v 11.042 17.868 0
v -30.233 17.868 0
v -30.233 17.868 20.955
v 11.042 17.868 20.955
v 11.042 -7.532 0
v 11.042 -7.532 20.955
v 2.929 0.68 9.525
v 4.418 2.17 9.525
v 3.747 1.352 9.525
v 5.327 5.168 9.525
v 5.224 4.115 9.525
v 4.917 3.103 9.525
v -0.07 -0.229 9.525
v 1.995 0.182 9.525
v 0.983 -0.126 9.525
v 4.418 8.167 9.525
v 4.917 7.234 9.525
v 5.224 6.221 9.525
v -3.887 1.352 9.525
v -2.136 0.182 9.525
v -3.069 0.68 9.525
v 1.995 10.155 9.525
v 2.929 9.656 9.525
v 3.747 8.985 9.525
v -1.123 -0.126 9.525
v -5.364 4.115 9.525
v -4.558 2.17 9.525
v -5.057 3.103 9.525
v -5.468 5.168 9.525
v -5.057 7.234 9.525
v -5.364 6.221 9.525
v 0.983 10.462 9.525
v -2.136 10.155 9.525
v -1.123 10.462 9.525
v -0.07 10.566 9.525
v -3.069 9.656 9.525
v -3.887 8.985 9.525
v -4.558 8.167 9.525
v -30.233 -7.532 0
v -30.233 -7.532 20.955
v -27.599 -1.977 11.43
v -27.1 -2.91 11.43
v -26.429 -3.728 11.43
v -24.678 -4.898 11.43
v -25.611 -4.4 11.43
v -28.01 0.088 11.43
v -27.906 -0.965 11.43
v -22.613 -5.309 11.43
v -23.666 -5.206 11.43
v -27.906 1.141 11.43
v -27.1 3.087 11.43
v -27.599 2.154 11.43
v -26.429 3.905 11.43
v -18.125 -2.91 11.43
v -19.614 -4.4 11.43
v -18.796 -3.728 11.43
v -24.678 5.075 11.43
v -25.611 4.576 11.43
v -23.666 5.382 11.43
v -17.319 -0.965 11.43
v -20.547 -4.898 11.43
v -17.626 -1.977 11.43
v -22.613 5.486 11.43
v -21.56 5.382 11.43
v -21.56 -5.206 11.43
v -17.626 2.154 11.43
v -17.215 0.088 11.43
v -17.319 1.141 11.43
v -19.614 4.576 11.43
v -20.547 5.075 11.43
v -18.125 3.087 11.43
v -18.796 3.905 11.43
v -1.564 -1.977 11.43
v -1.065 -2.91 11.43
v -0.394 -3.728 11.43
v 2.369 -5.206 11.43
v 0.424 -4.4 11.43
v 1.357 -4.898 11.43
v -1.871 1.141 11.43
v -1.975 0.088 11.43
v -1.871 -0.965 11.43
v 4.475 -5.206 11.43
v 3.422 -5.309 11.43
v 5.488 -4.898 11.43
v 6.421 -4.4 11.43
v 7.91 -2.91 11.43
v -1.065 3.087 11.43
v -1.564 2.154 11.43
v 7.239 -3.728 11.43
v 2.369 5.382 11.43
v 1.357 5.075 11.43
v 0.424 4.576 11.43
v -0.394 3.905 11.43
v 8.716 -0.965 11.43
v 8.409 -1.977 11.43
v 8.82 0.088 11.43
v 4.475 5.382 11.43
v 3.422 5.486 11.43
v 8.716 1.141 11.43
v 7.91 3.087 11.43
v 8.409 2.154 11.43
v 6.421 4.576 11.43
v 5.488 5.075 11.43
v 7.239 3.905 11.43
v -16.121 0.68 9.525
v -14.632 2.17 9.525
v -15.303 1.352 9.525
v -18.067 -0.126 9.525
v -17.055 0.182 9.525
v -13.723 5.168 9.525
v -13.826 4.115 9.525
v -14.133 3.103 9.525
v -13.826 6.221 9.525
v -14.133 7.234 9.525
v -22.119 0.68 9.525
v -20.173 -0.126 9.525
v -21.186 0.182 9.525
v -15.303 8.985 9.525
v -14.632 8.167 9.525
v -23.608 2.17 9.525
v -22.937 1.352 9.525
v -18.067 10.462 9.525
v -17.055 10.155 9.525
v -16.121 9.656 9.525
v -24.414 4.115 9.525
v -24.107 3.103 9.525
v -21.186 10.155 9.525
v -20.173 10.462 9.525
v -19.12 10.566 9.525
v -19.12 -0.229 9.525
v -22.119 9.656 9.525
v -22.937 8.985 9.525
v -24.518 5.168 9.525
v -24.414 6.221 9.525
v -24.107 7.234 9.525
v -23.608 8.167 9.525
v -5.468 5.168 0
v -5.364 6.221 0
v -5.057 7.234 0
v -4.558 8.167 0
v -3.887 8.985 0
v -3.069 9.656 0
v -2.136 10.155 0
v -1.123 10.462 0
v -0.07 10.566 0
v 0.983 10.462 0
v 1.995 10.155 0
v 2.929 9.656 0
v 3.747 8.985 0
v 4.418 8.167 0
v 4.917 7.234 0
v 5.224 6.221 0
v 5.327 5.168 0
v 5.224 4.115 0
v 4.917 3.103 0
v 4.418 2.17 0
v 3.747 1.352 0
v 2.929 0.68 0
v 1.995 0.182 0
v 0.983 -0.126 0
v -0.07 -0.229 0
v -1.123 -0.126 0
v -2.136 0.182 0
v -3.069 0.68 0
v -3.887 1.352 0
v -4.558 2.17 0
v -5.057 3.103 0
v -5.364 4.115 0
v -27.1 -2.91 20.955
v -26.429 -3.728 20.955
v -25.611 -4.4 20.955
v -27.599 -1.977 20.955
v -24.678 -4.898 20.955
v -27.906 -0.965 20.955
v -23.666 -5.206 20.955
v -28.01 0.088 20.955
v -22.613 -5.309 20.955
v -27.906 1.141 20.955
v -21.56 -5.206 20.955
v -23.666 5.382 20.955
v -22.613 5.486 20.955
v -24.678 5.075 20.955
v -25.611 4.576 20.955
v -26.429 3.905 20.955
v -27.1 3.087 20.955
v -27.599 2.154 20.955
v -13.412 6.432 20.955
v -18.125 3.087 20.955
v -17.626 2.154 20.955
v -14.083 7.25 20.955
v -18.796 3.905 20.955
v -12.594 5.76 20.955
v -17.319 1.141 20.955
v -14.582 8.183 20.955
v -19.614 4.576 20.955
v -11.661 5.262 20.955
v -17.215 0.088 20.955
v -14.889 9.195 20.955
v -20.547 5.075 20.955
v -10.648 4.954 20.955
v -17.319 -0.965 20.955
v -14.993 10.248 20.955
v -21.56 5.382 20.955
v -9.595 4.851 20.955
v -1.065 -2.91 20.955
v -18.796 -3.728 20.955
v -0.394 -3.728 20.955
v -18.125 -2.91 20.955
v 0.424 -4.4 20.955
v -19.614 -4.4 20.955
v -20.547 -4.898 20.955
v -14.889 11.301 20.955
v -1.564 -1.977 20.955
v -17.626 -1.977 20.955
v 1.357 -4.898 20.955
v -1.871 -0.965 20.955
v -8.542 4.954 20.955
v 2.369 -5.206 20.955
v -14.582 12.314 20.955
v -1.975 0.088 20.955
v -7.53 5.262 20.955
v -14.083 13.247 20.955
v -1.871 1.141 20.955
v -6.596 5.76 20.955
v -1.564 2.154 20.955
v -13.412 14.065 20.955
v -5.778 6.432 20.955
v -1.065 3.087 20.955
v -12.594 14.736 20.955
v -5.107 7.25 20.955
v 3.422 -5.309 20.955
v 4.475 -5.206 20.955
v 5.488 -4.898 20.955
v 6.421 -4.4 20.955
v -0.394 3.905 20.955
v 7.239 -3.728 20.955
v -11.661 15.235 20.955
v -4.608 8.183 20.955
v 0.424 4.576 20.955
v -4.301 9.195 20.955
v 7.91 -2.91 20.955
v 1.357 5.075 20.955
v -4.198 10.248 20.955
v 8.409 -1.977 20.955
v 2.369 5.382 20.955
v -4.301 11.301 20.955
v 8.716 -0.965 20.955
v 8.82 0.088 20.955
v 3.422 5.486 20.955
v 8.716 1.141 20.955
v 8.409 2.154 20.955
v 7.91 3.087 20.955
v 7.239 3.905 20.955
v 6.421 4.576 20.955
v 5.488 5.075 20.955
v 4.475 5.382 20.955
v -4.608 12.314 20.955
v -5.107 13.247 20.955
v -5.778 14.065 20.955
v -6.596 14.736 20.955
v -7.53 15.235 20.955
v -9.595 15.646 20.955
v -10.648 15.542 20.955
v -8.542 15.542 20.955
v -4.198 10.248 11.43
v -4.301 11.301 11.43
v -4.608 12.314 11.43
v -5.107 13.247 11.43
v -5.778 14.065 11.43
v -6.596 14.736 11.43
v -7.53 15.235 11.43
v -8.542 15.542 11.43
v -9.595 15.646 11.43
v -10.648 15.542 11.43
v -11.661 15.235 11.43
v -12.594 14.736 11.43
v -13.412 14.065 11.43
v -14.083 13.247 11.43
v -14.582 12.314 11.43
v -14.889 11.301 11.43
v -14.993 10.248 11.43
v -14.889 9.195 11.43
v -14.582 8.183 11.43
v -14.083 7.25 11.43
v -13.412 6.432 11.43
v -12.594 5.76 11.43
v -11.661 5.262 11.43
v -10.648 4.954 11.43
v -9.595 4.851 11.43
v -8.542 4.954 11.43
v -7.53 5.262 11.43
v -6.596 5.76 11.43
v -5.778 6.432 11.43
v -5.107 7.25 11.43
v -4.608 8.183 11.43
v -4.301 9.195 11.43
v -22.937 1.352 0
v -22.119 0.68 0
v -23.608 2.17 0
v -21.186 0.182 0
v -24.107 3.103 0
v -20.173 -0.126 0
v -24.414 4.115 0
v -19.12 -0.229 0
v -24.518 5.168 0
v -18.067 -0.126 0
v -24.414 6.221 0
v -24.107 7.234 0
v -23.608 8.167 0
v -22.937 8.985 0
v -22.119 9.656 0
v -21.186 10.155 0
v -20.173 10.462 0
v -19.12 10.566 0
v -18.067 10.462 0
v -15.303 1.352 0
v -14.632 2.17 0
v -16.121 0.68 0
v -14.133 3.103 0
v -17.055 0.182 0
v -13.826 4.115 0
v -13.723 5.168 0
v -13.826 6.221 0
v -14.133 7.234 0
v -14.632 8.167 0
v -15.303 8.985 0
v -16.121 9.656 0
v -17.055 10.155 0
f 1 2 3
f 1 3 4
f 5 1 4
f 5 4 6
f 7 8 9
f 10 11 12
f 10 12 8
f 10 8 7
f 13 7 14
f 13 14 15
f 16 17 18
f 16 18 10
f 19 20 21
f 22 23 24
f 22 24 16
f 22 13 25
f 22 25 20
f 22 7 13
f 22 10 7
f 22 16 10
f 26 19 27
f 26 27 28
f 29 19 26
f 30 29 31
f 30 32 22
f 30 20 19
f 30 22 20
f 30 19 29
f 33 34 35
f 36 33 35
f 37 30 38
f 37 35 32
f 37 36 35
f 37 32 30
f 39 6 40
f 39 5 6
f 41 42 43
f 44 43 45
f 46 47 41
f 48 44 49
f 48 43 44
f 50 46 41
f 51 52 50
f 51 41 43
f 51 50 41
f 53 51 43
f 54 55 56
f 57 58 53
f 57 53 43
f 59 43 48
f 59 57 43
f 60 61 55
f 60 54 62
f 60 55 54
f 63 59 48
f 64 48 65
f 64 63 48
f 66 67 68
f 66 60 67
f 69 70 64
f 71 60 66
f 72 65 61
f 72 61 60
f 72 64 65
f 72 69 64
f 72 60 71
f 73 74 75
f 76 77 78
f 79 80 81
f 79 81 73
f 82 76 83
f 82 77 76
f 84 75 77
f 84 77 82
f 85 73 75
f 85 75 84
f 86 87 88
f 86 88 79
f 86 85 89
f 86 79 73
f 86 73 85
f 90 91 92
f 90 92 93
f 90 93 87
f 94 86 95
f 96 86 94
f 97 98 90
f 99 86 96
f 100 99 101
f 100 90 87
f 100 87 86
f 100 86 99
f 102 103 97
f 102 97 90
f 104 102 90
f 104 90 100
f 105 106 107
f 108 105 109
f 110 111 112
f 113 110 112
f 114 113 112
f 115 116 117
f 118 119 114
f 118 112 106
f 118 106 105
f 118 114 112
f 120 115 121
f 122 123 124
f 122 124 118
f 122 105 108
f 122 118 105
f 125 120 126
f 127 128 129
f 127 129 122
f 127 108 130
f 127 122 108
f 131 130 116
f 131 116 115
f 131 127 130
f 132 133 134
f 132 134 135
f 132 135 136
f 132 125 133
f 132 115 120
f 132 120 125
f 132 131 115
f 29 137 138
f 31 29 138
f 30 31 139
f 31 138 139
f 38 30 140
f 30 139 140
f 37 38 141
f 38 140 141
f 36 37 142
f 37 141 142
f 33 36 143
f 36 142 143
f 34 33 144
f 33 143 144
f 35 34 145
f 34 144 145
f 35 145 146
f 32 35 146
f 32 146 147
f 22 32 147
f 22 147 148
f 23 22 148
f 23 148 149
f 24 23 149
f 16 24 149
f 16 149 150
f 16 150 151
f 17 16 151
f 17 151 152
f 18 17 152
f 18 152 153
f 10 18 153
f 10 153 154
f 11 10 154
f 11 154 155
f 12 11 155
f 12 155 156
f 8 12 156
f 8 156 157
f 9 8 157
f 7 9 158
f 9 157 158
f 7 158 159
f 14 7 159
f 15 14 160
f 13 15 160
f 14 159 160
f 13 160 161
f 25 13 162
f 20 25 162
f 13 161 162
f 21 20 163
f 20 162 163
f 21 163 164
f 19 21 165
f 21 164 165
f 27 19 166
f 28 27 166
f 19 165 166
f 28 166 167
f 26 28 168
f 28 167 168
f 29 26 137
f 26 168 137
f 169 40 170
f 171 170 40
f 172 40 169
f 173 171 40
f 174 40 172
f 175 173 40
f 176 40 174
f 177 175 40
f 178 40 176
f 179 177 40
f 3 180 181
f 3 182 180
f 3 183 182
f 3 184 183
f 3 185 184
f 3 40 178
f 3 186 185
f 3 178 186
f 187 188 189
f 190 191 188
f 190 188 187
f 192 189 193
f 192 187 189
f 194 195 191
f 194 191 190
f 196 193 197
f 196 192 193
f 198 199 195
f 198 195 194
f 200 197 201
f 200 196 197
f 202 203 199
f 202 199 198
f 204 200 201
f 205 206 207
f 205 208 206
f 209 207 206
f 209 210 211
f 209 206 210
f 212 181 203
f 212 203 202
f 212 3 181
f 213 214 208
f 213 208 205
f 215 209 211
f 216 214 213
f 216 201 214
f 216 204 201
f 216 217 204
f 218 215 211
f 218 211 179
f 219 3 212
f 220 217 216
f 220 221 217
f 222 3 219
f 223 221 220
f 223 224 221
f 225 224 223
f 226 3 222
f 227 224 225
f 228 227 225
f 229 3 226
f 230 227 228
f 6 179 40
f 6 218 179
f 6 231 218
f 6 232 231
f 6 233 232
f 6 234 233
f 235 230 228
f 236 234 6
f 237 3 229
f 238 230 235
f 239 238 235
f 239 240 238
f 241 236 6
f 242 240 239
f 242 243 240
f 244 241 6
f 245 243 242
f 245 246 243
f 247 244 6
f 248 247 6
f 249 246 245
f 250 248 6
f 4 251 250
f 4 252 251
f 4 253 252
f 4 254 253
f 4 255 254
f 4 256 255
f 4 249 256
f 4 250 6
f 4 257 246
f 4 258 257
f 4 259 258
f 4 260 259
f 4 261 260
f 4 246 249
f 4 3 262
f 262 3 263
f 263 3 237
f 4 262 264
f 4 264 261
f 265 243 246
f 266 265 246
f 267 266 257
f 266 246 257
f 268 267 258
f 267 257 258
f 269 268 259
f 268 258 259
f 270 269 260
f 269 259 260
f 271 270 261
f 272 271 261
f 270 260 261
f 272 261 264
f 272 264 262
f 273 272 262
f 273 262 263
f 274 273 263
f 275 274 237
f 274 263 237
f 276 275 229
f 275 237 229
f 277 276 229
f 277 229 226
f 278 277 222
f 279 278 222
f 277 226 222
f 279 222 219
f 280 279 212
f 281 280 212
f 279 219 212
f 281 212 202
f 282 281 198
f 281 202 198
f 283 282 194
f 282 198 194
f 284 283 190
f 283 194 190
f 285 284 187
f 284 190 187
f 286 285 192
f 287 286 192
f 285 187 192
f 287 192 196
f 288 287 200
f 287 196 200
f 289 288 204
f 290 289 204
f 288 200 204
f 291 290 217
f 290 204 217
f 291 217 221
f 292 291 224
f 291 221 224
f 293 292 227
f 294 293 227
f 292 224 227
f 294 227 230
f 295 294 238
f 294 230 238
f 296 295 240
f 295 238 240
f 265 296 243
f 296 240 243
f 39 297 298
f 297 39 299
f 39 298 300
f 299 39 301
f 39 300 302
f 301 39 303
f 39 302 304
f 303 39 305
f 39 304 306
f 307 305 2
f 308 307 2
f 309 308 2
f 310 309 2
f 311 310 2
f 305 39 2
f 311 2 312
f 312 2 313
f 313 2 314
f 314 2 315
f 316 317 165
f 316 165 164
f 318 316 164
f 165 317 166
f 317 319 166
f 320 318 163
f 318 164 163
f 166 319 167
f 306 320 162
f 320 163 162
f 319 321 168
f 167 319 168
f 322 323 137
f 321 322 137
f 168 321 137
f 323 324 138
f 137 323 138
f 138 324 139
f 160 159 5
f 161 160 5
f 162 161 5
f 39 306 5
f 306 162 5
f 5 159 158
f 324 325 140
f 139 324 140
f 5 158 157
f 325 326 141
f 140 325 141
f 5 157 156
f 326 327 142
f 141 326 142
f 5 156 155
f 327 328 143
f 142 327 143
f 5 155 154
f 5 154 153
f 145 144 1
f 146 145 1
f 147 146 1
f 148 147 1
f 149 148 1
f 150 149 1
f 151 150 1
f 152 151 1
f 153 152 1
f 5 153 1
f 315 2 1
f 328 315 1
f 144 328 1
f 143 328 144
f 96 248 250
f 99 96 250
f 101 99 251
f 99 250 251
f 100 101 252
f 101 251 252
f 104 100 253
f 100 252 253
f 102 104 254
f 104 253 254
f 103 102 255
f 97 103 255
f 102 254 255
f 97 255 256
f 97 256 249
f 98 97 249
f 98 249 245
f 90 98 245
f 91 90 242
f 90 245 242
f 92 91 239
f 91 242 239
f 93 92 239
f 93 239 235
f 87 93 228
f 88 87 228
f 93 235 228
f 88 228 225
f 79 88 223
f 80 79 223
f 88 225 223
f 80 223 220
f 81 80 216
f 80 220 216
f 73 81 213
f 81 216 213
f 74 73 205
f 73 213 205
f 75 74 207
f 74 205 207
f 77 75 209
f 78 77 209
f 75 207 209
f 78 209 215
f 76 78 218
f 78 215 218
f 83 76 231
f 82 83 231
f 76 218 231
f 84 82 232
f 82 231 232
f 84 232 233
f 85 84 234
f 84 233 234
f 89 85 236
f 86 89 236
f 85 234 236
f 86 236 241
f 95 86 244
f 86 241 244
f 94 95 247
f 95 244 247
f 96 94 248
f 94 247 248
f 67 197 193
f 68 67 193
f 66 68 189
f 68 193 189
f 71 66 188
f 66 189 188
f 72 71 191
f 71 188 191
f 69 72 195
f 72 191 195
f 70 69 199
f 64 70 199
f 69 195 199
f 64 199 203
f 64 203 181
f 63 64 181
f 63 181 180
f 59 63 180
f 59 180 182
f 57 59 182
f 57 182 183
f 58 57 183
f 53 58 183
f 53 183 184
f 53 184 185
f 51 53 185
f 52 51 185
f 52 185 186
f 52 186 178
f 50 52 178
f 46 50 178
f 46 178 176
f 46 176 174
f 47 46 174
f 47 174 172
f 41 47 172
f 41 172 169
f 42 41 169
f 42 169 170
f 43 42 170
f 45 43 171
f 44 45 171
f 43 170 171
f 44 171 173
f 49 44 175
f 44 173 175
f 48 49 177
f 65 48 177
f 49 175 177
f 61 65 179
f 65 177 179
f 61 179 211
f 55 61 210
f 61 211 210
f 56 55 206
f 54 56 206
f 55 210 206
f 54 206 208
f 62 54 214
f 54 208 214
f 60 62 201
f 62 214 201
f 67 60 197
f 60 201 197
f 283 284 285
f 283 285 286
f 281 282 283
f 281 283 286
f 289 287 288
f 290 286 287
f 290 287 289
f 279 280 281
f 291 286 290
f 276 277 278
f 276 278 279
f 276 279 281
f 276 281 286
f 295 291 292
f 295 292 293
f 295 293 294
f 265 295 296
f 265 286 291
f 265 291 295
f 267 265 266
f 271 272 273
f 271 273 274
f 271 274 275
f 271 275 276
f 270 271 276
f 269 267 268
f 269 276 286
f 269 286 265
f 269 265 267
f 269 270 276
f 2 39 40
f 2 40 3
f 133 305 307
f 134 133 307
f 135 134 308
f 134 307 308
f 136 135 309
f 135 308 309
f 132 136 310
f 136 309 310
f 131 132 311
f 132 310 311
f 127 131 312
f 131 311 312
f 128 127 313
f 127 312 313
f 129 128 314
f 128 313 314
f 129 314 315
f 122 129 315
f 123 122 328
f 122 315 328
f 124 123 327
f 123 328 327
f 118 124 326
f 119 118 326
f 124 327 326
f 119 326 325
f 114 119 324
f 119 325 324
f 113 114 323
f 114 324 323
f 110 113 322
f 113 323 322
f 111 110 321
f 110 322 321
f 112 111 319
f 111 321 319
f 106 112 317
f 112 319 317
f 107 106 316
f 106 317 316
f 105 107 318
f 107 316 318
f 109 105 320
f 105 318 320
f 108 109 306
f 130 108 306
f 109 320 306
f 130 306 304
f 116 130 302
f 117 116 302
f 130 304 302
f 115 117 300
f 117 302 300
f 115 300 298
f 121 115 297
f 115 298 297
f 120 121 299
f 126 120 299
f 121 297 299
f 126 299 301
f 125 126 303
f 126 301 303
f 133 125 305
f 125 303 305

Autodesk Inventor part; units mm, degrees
ref_plane "YZ Plane" through (0, 0, 0) normal (1, 0, 0) x (0, 1, 0)
ref_plane "XZ Plane" through (0, 0, 0) normal (0, 1, 0) x (-1, 0, 0)
ref_plane "XY Plane" through (0, 0, 0) normal (0, 0, 1) x (1, 0, 0)
sketch "Sketch1" plane through (0, 0, 0) normal (0, 0, 1) x (1, 0, 0)
  line L0 (-30.2326, 17.8682) -> (11.0424, 17.8682)
  line L1 (11.0424, 17.8682) -> (11.0424, -7.5318)
  line L2 (11.0424, -7.5318) -> (-30.2326, -7.5318)
  line L3 (-30.2326, -7.5318) -> (-30.2326, 17.8682)
  point P0 (0, 0)
  dimension "d0" = 41.275
  dimension "d1" = 25.4
extrude "Extrusion1" add sketch "Sketch1" along normal blind 20.955
sketch "Sketch2" plane through (0, 0, 20.955) normal (0, 0, 1) x (1, 0, 0)
  line L0 (11.0424, 17.8682) -> (11.0424, -7.5318) projected
  line L1 (-30.2326, 17.8682) -> (11.0424, 17.8682) projected
  line L2 (-30.2326, -7.5318) -> (-30.2326, 17.8682) projected
  line L3 (11.0424, -7.5318) -> (-30.2326, -7.5318) projected
  circle A0 centre (-9.5951, 10.2482) radius 5.3975
  circle A1 centre (-22.6126, 0.0882) radius 5.3975
  circle A2 centre (3.4224, 0.0882) radius 5.3975
  dimension "d4" = 10.795
  dimension "d5" = 7.62
  dimension "d6" = 7.62
  dimension "d7" = 7.62
  dimension "d8" = 7.62
  dimension "d9" = 7.62
extrude "Extrusion2" cut sketch "Sketch2" against normal blind 9.525 contours A0 | A1 | A2
thread "Thread1" size "7/16-14 UNC" class "2B" standard "ANSI Unified Screw Threads" full length
thread "Thread2" size "7/16-14 UNC" class "2B" standard "ANSI Unified Screw Threads" full length
thread "Thread3" size "7/16-14 UNC" class "2B" standard "ANSI Unified Screw Threads" full length
sketch "Sketch3" plane through (0, 0, 0) normal (0, 0, -1) x (-1, 0, 0)
  line L0 (30.2326, -7.5318) -> (30.2326, 17.8682) projected
  circle A0 centre (0.0701, 5.1682) radius 5.3975
  circle A1 centre (19.1201, 5.1682) radius 5.3975
  point P0 (0, 0)
  dimension "d18" = 10.795
  dimension "d19" = 19.05
  dimension "d20" = 11.1125
extrude "Extrusion3" cut sketch "Sketch3" against normal blind 9.525
thread "Thread4" size "7/16-14 UNC" class "2B" standard "ANSI Unified Screw Threads" full length
thread "Thread5" size "7/16-14 UNC" class "2B" standard "ANSI Unified Screw Threads" full length
properties part number "Solenoid Base 1764"
